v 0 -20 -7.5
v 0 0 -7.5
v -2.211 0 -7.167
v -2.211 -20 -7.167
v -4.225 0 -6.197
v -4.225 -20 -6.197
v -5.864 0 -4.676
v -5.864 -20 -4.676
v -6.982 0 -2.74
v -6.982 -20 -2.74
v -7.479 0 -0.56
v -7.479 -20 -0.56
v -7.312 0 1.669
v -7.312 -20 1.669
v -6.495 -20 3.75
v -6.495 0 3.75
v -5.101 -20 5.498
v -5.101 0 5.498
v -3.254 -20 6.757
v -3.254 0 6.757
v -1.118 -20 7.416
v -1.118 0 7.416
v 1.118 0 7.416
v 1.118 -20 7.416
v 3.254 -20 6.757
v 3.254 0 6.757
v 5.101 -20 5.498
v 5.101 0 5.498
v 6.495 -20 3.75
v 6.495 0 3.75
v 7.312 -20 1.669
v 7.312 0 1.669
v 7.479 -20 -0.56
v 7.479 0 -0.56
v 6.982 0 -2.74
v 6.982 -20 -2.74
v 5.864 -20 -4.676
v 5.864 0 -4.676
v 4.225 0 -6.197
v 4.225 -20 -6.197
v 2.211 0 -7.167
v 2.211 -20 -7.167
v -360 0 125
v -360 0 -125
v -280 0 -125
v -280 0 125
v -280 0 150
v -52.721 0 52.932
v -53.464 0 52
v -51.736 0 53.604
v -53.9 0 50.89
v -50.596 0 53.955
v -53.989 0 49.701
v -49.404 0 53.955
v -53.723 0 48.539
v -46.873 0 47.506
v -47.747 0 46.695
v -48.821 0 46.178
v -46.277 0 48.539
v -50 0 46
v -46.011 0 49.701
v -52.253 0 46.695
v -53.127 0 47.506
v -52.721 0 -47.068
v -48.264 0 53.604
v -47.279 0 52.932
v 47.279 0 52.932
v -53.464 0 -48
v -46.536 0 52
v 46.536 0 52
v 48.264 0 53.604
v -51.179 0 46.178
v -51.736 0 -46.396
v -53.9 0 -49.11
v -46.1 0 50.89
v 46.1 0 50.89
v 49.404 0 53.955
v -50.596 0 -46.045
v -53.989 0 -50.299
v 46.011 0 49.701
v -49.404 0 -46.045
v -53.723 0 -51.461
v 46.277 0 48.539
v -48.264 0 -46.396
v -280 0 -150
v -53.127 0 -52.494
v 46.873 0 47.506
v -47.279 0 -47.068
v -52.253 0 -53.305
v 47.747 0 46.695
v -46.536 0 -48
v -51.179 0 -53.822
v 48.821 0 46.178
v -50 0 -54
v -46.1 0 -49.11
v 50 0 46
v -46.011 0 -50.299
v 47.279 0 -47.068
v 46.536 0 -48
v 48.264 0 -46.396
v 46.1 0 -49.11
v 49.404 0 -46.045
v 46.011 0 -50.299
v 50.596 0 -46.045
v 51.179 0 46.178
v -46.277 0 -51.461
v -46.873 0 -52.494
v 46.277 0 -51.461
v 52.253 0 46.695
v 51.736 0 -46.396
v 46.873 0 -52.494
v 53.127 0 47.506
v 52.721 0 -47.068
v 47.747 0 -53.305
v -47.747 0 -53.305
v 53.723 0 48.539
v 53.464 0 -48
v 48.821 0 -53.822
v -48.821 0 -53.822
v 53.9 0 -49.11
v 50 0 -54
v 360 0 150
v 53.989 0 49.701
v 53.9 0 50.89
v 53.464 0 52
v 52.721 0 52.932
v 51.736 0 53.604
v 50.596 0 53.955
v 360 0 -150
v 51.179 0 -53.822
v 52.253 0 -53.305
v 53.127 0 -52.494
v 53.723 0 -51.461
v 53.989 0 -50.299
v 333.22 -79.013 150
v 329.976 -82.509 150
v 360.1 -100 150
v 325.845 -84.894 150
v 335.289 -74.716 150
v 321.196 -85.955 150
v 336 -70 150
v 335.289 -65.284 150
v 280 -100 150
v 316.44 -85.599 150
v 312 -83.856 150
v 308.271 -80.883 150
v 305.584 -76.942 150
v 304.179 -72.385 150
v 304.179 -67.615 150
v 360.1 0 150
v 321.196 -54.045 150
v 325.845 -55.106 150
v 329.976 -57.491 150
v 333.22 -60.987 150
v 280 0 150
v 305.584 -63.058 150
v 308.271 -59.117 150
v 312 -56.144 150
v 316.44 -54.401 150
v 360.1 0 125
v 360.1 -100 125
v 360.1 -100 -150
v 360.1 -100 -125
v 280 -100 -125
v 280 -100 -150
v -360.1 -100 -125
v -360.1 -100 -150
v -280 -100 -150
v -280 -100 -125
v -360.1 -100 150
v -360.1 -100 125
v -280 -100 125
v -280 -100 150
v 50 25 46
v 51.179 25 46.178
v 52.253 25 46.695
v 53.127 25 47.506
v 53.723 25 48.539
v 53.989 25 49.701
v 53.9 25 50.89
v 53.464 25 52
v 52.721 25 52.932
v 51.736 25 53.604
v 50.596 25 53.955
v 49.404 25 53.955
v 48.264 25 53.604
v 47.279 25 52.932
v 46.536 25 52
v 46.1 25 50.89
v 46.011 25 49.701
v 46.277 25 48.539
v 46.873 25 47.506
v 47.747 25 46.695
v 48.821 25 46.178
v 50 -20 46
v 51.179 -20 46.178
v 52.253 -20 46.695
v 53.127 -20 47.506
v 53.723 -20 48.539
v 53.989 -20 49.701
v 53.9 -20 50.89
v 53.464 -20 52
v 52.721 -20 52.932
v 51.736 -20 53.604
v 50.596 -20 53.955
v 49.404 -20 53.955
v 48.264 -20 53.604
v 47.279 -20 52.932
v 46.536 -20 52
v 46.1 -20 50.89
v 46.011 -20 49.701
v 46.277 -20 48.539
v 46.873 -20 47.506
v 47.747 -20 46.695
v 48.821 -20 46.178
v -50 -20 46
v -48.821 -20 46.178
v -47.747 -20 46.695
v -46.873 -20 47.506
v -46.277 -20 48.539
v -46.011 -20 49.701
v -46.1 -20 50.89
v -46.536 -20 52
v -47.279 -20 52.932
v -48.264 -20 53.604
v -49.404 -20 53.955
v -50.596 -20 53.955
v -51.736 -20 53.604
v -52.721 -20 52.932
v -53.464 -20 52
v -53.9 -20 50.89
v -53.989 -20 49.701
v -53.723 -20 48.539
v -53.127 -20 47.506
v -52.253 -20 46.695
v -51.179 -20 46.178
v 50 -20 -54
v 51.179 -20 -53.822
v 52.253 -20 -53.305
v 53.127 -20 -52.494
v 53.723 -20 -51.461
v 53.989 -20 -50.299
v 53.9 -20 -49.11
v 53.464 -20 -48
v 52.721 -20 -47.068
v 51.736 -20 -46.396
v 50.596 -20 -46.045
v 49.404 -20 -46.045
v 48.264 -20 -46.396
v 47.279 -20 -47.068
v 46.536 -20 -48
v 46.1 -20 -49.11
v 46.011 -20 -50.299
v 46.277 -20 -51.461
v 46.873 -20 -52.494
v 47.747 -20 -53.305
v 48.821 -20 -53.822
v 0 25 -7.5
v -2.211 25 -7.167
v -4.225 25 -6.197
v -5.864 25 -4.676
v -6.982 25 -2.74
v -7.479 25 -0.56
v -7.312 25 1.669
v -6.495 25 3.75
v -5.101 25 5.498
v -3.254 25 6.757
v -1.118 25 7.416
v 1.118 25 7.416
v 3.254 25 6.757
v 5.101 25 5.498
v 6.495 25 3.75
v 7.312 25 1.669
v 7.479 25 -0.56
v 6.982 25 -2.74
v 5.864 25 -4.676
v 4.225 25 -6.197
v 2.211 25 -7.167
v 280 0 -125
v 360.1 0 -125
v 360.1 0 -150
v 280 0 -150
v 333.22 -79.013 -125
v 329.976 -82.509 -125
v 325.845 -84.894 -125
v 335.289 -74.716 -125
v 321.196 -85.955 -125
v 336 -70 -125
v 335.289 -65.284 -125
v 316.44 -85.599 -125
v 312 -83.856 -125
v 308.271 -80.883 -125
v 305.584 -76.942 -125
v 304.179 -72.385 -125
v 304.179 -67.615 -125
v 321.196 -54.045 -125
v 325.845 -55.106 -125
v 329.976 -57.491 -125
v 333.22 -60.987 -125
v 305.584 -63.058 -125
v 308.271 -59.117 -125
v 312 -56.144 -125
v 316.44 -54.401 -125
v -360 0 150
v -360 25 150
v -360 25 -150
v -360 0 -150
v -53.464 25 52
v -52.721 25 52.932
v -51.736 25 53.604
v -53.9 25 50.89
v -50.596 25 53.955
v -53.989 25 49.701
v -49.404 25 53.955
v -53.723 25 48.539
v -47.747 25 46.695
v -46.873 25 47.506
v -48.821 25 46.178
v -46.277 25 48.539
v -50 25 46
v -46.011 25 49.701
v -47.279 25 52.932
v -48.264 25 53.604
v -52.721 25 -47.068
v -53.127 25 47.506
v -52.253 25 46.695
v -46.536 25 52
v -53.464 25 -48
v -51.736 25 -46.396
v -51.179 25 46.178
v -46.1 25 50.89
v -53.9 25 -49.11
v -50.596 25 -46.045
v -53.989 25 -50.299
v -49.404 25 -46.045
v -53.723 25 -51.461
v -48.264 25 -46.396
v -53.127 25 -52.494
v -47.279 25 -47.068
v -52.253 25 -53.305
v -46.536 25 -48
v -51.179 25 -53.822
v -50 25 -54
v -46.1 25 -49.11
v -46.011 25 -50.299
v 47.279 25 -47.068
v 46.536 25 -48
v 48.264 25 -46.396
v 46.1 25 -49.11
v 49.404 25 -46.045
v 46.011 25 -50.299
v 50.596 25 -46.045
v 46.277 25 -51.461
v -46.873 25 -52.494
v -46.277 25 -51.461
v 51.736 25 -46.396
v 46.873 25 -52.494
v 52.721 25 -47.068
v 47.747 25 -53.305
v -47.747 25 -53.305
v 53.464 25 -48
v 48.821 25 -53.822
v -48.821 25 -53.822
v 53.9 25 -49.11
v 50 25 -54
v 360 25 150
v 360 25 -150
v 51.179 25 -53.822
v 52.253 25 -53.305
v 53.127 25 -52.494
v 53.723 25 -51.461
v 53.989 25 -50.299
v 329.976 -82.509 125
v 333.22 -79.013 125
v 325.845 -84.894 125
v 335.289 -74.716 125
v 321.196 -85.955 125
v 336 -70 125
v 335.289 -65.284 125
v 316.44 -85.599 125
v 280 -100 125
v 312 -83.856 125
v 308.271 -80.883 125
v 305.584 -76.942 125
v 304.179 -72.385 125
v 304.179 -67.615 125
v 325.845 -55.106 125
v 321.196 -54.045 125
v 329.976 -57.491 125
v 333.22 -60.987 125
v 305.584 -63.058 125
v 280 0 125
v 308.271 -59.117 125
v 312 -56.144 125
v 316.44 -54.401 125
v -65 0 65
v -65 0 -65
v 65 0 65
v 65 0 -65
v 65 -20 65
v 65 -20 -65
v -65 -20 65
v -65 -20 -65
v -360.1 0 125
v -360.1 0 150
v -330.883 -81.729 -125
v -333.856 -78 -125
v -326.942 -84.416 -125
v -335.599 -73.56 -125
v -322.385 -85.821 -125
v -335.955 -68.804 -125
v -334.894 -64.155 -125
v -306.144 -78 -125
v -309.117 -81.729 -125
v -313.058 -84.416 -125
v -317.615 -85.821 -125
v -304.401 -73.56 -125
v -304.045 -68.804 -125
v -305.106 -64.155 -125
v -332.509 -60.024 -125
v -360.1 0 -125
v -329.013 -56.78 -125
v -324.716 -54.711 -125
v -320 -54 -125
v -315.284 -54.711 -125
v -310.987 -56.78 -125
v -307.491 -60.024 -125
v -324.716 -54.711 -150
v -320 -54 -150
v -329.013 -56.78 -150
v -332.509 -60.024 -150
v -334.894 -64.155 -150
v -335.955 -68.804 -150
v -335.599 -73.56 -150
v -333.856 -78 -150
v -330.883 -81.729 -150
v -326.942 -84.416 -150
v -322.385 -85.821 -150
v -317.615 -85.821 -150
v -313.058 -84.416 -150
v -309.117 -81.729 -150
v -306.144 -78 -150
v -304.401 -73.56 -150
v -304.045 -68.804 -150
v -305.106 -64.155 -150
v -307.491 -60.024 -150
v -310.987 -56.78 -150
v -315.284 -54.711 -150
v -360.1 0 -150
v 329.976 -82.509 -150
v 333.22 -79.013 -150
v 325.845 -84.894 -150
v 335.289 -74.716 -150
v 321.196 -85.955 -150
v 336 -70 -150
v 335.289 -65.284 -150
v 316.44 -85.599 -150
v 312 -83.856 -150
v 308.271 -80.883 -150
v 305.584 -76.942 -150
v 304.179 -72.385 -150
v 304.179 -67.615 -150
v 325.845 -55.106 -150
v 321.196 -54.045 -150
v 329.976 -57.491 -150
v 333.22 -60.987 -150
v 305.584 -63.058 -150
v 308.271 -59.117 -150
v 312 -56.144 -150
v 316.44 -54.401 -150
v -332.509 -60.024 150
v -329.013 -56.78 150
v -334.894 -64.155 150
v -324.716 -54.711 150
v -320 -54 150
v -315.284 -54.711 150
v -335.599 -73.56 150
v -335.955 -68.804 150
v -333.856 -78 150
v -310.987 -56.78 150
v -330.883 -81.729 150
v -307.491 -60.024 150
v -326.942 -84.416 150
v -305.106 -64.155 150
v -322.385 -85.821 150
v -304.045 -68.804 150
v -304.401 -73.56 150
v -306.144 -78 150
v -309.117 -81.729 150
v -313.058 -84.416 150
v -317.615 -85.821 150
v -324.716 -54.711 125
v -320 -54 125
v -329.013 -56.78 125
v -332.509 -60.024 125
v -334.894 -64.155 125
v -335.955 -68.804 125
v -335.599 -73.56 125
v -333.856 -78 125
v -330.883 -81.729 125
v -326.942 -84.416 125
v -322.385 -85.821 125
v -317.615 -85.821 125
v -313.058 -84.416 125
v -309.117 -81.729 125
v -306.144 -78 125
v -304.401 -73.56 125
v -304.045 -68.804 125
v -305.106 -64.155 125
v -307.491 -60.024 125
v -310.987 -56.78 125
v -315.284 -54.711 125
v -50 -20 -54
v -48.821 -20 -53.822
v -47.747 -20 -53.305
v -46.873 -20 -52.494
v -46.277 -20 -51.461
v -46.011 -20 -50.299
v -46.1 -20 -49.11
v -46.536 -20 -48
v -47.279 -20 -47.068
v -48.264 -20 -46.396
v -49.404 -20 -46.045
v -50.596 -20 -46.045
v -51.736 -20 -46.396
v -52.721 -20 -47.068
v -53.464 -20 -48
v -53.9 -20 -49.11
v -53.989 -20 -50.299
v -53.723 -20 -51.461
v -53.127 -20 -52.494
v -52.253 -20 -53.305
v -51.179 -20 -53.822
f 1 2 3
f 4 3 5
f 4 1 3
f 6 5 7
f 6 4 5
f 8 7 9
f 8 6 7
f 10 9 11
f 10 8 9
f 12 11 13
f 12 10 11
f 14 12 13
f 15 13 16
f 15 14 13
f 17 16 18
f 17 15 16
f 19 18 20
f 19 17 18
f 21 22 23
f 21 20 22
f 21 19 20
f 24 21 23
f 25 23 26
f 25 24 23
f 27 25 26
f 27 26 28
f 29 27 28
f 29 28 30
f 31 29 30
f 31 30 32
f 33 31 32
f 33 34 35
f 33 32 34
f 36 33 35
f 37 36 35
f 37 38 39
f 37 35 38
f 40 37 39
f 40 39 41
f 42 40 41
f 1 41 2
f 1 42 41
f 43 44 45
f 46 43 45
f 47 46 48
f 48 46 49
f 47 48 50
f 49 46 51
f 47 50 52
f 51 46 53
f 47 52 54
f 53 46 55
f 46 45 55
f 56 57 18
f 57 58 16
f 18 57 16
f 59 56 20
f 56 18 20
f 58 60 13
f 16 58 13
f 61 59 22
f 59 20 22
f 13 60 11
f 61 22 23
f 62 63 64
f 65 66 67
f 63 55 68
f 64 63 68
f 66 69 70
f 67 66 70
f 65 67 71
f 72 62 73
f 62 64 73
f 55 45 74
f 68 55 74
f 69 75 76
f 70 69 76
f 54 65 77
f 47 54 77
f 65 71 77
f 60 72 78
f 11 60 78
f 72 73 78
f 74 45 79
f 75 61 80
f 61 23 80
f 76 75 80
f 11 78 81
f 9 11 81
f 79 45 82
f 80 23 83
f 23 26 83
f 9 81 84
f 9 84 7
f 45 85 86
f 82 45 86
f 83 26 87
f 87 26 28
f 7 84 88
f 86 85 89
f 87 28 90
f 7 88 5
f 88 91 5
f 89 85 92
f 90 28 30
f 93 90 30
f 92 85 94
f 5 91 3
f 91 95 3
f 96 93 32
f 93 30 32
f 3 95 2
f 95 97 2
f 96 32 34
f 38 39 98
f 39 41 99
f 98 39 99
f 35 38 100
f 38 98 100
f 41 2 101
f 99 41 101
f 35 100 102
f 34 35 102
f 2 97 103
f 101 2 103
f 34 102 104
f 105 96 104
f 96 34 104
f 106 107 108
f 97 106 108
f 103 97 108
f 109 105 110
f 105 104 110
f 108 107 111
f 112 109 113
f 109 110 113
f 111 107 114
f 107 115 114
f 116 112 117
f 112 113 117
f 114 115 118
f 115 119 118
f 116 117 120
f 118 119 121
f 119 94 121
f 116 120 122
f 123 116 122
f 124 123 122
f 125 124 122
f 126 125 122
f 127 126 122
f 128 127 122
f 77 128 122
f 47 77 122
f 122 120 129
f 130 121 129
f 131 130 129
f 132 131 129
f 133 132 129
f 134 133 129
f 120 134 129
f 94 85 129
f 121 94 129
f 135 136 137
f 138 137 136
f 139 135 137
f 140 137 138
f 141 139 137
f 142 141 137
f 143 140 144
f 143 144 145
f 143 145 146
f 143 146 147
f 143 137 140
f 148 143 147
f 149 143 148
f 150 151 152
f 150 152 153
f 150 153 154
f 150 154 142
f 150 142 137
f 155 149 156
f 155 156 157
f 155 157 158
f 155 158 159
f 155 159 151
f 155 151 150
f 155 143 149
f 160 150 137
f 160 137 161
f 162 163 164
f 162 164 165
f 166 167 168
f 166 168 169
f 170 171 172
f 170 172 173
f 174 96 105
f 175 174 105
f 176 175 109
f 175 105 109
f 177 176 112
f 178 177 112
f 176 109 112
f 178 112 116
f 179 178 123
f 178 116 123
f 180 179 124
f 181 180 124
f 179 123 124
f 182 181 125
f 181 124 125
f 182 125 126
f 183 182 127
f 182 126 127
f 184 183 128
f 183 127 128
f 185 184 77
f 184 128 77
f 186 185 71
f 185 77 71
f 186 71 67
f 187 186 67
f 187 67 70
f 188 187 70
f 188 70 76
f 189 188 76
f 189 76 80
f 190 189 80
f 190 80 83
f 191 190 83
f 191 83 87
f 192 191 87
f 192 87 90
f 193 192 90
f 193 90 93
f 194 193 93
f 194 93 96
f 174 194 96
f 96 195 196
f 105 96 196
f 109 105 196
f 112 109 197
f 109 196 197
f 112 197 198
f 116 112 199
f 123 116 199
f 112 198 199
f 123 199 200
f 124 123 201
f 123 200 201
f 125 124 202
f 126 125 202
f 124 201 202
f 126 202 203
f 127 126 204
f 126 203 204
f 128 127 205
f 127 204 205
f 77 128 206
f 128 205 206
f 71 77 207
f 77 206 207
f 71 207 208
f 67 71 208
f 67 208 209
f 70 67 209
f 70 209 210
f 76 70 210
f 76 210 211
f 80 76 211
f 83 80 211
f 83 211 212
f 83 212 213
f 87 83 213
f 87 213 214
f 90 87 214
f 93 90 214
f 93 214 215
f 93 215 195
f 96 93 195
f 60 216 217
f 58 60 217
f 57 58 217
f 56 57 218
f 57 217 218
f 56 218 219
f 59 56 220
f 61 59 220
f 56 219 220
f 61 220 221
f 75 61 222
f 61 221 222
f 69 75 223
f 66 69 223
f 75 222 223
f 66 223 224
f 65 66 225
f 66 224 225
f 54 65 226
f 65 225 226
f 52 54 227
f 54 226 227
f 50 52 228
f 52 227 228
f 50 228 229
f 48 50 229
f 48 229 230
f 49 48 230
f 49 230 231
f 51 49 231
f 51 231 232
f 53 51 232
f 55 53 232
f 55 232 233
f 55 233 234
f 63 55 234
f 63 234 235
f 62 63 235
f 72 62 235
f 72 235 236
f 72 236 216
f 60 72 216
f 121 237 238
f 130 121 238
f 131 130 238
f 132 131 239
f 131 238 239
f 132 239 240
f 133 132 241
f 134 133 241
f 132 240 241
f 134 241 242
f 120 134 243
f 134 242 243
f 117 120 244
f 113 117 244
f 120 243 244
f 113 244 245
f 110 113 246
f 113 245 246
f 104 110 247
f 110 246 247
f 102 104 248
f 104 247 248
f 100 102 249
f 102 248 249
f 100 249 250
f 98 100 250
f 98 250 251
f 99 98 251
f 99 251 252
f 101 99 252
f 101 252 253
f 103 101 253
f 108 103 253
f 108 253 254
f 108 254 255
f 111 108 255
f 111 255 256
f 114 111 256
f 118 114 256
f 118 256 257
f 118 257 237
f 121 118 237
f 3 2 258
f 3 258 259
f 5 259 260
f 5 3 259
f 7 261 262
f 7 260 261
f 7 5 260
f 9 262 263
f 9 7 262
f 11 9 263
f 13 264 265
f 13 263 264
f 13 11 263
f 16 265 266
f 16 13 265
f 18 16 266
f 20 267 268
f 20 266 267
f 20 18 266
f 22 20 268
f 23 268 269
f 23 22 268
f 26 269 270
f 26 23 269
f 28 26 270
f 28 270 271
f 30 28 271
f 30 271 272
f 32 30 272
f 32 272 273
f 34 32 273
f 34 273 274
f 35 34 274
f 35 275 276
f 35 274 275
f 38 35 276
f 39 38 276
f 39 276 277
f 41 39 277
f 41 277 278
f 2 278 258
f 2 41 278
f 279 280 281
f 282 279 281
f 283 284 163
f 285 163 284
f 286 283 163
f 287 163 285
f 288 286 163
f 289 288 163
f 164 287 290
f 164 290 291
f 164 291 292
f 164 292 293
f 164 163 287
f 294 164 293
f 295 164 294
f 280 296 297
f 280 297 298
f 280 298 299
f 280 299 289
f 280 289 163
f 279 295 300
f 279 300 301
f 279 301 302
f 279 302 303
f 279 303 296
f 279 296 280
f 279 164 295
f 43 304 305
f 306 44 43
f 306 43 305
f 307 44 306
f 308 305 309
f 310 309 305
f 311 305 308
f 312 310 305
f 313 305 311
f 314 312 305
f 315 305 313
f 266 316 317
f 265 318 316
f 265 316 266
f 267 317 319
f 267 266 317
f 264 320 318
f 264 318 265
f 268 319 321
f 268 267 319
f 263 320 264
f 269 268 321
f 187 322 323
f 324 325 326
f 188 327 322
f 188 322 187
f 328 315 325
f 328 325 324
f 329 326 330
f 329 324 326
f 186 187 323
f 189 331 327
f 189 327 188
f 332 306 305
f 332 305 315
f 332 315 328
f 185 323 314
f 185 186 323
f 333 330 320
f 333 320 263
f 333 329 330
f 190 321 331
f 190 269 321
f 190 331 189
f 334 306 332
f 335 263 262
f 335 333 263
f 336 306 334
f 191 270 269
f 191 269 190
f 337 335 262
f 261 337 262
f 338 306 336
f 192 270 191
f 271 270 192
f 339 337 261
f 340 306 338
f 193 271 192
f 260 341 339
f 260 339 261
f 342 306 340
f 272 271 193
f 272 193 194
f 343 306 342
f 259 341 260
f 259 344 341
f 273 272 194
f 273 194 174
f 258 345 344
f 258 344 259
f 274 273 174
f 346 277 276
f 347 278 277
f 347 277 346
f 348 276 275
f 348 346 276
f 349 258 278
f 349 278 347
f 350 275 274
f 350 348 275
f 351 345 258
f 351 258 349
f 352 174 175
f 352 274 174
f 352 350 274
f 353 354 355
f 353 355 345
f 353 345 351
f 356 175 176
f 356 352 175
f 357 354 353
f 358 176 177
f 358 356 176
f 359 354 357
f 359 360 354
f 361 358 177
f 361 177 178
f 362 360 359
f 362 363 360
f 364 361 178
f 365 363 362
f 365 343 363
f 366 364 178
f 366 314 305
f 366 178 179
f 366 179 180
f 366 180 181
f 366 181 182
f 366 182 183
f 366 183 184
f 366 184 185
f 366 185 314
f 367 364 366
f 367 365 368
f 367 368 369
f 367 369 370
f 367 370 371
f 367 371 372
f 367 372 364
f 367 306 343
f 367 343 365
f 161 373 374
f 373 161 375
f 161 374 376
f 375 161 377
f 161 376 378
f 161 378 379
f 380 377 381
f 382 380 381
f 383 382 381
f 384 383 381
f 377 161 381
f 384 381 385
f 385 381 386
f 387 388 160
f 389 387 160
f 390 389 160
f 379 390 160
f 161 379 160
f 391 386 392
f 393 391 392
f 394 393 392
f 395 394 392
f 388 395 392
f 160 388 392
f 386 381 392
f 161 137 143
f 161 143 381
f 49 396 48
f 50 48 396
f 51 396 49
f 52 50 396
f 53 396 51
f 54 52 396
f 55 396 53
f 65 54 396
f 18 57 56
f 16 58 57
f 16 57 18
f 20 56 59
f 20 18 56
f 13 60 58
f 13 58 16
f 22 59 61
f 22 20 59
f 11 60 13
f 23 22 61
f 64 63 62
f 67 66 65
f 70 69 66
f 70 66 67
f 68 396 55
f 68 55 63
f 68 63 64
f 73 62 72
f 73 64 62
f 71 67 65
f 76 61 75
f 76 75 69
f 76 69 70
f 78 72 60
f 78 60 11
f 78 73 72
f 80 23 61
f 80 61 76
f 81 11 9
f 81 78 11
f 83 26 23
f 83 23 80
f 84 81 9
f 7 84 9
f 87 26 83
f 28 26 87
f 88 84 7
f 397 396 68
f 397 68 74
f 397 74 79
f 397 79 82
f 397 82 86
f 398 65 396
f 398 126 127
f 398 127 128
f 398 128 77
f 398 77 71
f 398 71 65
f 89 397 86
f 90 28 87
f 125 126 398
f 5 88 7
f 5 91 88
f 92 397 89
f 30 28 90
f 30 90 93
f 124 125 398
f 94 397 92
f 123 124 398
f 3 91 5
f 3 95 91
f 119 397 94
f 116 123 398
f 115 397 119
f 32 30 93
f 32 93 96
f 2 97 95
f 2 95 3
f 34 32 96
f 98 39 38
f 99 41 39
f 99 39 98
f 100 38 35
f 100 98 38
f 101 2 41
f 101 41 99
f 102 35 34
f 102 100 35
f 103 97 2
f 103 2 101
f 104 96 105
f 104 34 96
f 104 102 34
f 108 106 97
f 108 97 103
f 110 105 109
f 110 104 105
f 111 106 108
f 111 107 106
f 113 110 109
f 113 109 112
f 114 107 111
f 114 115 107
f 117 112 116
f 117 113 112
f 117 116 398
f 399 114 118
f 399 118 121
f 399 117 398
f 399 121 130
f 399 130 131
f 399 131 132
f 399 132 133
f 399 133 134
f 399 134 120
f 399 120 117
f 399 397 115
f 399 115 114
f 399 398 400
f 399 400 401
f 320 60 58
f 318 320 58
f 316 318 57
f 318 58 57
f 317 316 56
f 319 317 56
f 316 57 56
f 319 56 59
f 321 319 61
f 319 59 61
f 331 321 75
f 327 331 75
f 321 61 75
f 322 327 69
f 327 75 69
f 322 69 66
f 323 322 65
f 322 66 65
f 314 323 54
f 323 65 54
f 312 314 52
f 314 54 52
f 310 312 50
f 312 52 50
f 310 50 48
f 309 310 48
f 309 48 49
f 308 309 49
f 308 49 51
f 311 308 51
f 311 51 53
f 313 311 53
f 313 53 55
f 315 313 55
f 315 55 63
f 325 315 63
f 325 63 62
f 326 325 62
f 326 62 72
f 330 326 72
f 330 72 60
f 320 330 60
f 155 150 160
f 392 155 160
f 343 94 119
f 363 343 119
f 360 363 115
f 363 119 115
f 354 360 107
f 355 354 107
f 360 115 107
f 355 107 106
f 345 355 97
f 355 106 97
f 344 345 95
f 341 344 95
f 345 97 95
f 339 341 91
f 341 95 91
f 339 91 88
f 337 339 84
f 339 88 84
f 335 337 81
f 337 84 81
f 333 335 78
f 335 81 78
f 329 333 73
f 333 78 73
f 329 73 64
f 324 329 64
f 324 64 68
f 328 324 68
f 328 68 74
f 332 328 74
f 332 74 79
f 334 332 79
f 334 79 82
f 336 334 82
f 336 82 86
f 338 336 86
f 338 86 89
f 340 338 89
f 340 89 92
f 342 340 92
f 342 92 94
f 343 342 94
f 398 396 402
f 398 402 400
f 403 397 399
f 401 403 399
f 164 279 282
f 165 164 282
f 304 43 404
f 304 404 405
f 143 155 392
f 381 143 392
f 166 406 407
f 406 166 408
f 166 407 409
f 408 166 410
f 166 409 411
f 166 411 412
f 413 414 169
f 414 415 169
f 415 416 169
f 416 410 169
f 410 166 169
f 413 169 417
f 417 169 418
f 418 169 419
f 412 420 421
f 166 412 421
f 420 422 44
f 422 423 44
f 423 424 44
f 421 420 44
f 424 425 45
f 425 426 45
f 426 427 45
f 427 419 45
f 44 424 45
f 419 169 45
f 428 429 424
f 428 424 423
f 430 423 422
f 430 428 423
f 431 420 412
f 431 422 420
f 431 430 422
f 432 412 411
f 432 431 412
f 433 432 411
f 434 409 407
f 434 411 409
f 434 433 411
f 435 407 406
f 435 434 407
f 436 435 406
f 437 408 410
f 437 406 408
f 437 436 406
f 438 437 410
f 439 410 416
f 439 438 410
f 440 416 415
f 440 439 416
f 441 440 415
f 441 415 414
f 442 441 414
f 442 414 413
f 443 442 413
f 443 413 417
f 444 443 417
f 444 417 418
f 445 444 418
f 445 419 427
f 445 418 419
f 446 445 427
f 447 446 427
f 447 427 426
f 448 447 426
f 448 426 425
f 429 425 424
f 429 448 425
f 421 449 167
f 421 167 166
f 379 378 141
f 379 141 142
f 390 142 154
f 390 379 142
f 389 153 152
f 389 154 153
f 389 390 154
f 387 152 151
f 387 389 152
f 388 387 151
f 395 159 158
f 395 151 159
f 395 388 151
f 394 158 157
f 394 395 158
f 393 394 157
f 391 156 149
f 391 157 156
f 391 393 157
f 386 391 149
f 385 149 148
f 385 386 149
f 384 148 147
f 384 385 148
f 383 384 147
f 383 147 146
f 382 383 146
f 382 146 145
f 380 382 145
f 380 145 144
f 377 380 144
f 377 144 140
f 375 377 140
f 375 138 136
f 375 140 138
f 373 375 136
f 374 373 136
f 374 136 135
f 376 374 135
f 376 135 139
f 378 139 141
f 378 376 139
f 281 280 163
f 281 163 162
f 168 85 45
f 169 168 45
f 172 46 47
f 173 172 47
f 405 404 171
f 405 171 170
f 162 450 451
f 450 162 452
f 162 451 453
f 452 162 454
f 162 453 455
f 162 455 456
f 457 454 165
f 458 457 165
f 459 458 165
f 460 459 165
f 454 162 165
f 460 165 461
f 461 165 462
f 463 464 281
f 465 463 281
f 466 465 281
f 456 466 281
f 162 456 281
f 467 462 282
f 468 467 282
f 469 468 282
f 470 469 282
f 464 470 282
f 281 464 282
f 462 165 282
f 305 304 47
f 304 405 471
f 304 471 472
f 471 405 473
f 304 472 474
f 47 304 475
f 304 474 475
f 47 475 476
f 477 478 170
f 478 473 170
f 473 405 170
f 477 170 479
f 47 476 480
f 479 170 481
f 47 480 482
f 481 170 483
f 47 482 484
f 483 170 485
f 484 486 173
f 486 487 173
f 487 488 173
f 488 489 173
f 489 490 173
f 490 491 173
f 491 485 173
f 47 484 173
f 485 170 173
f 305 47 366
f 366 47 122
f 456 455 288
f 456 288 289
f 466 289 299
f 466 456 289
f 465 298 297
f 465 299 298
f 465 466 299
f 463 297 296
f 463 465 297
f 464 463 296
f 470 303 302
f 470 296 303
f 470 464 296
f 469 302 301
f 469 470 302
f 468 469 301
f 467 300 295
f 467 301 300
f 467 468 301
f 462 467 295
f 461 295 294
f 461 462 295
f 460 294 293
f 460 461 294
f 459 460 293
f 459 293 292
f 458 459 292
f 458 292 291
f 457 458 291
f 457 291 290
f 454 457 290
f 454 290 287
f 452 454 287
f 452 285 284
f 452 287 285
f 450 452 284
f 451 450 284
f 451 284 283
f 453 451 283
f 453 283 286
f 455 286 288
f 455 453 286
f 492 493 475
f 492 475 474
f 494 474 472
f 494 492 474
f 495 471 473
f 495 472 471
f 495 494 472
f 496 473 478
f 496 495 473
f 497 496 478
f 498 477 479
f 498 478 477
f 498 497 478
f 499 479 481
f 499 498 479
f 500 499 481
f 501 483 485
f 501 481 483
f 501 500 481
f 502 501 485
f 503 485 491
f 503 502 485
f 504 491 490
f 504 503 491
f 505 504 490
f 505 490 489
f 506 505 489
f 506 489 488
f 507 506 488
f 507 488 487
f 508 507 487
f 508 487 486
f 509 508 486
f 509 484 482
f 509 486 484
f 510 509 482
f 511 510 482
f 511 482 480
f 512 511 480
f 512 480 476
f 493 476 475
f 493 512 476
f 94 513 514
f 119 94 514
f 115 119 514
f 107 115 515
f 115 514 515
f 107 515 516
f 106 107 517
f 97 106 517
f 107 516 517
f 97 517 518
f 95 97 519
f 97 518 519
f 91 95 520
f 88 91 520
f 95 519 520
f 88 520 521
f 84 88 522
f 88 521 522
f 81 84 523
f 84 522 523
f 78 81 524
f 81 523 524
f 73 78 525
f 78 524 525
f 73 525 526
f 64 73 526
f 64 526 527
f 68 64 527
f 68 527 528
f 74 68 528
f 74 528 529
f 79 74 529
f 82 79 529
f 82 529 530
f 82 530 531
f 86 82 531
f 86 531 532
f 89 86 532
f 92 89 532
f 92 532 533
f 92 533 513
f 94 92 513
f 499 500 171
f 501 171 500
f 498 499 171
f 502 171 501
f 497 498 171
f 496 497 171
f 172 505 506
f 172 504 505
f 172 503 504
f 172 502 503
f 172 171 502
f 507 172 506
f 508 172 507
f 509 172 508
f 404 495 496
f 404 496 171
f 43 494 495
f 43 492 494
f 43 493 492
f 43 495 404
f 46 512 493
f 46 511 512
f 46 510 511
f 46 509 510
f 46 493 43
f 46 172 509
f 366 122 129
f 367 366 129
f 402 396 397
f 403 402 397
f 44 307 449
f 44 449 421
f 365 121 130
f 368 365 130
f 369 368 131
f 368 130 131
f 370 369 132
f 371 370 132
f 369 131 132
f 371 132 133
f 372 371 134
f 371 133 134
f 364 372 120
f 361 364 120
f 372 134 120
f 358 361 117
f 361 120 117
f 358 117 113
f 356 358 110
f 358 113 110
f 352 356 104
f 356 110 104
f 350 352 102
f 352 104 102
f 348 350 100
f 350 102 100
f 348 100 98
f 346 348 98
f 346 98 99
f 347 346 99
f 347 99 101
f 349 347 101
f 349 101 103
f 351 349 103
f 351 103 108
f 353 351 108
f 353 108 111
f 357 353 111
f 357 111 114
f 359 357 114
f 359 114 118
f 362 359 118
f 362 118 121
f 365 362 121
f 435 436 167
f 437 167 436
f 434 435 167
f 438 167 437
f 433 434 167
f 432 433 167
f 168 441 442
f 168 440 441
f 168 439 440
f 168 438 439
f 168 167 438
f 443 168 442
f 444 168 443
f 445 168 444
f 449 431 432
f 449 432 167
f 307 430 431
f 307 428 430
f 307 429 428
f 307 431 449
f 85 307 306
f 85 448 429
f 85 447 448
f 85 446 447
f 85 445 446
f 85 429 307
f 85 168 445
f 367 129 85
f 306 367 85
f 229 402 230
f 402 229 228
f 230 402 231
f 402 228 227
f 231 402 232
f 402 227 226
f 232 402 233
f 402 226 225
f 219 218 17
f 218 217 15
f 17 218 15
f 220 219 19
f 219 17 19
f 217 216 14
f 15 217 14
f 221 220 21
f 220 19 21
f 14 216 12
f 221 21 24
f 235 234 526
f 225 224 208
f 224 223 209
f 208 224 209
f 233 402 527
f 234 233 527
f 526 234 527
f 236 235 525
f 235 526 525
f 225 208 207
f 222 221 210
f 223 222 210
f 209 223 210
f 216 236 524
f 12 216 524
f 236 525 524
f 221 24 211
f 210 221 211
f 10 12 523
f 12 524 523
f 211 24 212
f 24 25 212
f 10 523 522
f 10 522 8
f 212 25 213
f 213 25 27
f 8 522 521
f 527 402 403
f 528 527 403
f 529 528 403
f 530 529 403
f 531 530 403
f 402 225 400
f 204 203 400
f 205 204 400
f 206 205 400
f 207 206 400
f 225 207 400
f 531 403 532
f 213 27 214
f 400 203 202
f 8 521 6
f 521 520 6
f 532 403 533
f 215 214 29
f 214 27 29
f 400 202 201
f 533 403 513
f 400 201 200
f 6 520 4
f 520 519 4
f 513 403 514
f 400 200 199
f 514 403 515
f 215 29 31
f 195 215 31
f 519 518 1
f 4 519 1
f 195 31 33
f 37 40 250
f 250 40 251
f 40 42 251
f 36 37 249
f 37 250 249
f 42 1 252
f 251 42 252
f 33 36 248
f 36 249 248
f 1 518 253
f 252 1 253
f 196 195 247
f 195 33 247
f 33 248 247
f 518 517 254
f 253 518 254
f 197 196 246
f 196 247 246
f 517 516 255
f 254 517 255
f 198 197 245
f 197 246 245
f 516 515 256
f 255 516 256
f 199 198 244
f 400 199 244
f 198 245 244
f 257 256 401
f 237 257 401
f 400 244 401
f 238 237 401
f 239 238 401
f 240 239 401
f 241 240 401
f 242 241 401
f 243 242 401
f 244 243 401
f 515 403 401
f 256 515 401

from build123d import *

# Parameters (mm, degrees)
SKETCH1_W                  = 720
SKETCH1_H                  = 300
BOSS_EXTRUDE1_DEPTH        = 25
SKETCH3_W                  = 130
SKETCH3_H                  = 130
BOSS_EXTRUDE3_DEPTH        = 20
CUT_EXTRUDE7_DEPTH         = 391.800460593
CUT_EXTRUDE7_DEPTH_BACK    = 20
SKETCH2_R                  = 7.5
SKETCH4_R                  = 4
CUT_EXTRUDE8_DEPTH         = 393.587569849
BOSS_EXTRUDE4_DEPTH        = 0.1
BOSS_EXTRUDE4_DEPTH_BACK   = 80
SKETCH5_W                  = 25
SKETCH5_H                  = 100
BOSS_EXTRUDE4_2_DEPTH      = 0.1
BOSS_EXTRUDE4_2_DEPTH_BACK = 80
BOSS_EXTRUDE5_DEPTH        = 0.1
BOSS_EXTRUDE5_DEPTH_BACK   = 80
SKETCH6_W                  = 25
SKETCH6_H                  = 100
CUT_EXTRUDE9_DEPTH         = 480.241077121
CUT_EXTRUDE9_DEPTH_BACK    = 480.241077121
SKETCH7_R                  = 16


with BuildPart() as part:
    # Sketch1 → Boss-Extrude1 (new body)
    with BuildSketch(Plane(origin=(0, 0, 0), x_dir=(1, 0, 0), z_dir=(0, 1, 0))):
        Rectangle(SKETCH1_W, SKETCH1_H)
    extrude(amount=BOSS_EXTRUDE1_DEPTH)


with BuildPart() as body_2:
    # Sketch3 → Boss-Extrude3 (new body)
    with BuildSketch(Plane(origin=(0, 0, 0), x_dir=(1, 0, 0), z_dir=(0, 1, 0))):
        Rectangle(SKETCH3_W, SKETCH3_H)
    extrude(amount=-BOSS_EXTRUDE3_DEPTH)


with BuildPart() as cut_extrude7_tool:
    # Sketch2 → Cut-Extrude7 (new, two sides: drawn at the far end of the back side and taken through both)
    with BuildSketch(Plane(origin=(0, 0, 0), x_dir=(1, 0, 0), z_dir=(0, 1, 0)).offset(-CUT_EXTRUDE7_DEPTH_BACK)):
        with Locations(Location((0, 0, 0), (0, 0, 90))):
            Circle(SKETCH2_R)
    extrude(amount=CUT_EXTRUDE7_DEPTH + CUT_EXTRUDE7_DEPTH_BACK)


with BuildPart() as part_1:
    add(part.part)

    # Cut-Extrude7: cut by cut_extrude7_tool
    add(cut_extrude7_tool.part, mode=Mode.SUBTRACT)


with BuildPart() as body_2_1:
    add(body_2.part)

    # Cut-Extrude7: cut by cut_extrude7_tool
    add(cut_extrude7_tool.part, mode=Mode.SUBTRACT)


with BuildPart() as cut_extrude8_tool:
    # Sketch4 → Cut-Extrude8 (new, through all)
    with BuildSketch(Plane(origin=(0, -20, 0), x_dir=(-1, 0, 0), z_dir=(0, -1, 0))):
        with Locations(Location((50, 50, 0), (0, 0, 90))):
            Circle(SKETCH4_R)
        with Locations(Location((50, -50, 0), (0, 0, 90))):
            Circle(SKETCH4_R)
        with Locations(Location((-50, -50, 0), (0, 0, 90))):
            Circle(SKETCH4_R)
        with Locations(Location((-50, 50, 0), (0, 0, 90))):
            Circle(SKETCH4_R)
    extrude(amount=-CUT_EXTRUDE8_DEPTH)


with BuildPart() as part_2:
    add(part_1.part)

    # Cut-Extrude8: cut by cut_extrude8_tool
    add(cut_extrude8_tool.part, mode=Mode.SUBTRACT)

    # Sketch6 → Boss-Extrude5 (add, two sides: drawn at the far end of the back side and taken through both)
    with BuildSketch(Plane.ZY.offset(360).offset(-BOSS_EXTRUDE5_DEPTH_BACK)):
        with Locations((-137.5, -50)):
            Rectangle(SKETCH6_W, SKETCH6_H)
        with Locations((137.5, -50)):
            Rectangle(SKETCH6_W, SKETCH6_H)
    extrude(amount=BOSS_EXTRUDE5_DEPTH + BOSS_EXTRUDE5_DEPTH_BACK)


with BuildPart() as body_2_2:
    add(body_2_1.part)

    # Cut-Extrude8: cut by cut_extrude8_tool
    add(cut_extrude8_tool.part, mode=Mode.SUBTRACT)


with BuildPart() as body_3:
    # Sketch5 → Boss-Extrude4 (new, two sides: drawn at the far end of the back side and taken through both)
    with BuildSketch(Plane(origin=(360, 0, 0), x_dir=(0, 0, -1), z_dir=(1, 0, 0)).offset(-BOSS_EXTRUDE4_DEPTH_BACK)):
        with Locations((-137.5, -50)):
            Rectangle(SKETCH5_W, SKETCH5_H)
    extrude(amount=BOSS_EXTRUDE4_DEPTH + BOSS_EXTRUDE4_DEPTH_BACK)


with BuildPart() as body_4:
    # Sketch5 → Boss-Extrude4 2 (new, two sides: drawn at the far end of the back side and taken through both)
    with BuildSketch(Plane(origin=(360, 0, 0), x_dir=(0, 0, -1), z_dir=(1, 0, 0)).offset(-BOSS_EXTRUDE4_2_DEPTH_BACK)):
        with Locations((137.5, -50)):
            Rectangle(SKETCH5_W, SKETCH5_H)
    extrude(amount=BOSS_EXTRUDE4_2_DEPTH + BOSS_EXTRUDE4_2_DEPTH_BACK)


with BuildPart() as cut_extrude9_tool:
    # Sketch7 → Cut-Extrude9 (new, two sides: drawn at the far end of the back side and taken through both)
    with BuildSketch(Plane.XY.offset(150).offset(-CUT_EXTRUDE9_DEPTH_BACK)):
        with Locations((320, -70)):
            Circle(SKETCH7_R)
        with Locations(Location((-320, -70, 0), (0, 0, 90))):
            Circle(SKETCH7_R)
    extrude(amount=CUT_EXTRUDE9_DEPTH + CUT_EXTRUDE9_DEPTH_BACK)


with BuildPart() as part_3:
    add(part_2.part)

    # Cut-Extrude9: cut by cut_extrude9_tool
    add(cut_extrude9_tool.part, mode=Mode.SUBTRACT)


with BuildPart() as body_3_1:
    add(body_3.part)

    # Cut-Extrude9: cut by cut_extrude9_tool
    add(cut_extrude9_tool.part, mode=Mode.SUBTRACT)


with BuildPart() as body_4_1:
    add(body_4.part)

    # Cut-Extrude9: cut by cut_extrude9_tool
    add(cut_extrude9_tool.part, mode=Mode.SUBTRACT)


solid = Compound([body_2_2.part, part_3.part, body_3_1.part, body_4_1.part])
